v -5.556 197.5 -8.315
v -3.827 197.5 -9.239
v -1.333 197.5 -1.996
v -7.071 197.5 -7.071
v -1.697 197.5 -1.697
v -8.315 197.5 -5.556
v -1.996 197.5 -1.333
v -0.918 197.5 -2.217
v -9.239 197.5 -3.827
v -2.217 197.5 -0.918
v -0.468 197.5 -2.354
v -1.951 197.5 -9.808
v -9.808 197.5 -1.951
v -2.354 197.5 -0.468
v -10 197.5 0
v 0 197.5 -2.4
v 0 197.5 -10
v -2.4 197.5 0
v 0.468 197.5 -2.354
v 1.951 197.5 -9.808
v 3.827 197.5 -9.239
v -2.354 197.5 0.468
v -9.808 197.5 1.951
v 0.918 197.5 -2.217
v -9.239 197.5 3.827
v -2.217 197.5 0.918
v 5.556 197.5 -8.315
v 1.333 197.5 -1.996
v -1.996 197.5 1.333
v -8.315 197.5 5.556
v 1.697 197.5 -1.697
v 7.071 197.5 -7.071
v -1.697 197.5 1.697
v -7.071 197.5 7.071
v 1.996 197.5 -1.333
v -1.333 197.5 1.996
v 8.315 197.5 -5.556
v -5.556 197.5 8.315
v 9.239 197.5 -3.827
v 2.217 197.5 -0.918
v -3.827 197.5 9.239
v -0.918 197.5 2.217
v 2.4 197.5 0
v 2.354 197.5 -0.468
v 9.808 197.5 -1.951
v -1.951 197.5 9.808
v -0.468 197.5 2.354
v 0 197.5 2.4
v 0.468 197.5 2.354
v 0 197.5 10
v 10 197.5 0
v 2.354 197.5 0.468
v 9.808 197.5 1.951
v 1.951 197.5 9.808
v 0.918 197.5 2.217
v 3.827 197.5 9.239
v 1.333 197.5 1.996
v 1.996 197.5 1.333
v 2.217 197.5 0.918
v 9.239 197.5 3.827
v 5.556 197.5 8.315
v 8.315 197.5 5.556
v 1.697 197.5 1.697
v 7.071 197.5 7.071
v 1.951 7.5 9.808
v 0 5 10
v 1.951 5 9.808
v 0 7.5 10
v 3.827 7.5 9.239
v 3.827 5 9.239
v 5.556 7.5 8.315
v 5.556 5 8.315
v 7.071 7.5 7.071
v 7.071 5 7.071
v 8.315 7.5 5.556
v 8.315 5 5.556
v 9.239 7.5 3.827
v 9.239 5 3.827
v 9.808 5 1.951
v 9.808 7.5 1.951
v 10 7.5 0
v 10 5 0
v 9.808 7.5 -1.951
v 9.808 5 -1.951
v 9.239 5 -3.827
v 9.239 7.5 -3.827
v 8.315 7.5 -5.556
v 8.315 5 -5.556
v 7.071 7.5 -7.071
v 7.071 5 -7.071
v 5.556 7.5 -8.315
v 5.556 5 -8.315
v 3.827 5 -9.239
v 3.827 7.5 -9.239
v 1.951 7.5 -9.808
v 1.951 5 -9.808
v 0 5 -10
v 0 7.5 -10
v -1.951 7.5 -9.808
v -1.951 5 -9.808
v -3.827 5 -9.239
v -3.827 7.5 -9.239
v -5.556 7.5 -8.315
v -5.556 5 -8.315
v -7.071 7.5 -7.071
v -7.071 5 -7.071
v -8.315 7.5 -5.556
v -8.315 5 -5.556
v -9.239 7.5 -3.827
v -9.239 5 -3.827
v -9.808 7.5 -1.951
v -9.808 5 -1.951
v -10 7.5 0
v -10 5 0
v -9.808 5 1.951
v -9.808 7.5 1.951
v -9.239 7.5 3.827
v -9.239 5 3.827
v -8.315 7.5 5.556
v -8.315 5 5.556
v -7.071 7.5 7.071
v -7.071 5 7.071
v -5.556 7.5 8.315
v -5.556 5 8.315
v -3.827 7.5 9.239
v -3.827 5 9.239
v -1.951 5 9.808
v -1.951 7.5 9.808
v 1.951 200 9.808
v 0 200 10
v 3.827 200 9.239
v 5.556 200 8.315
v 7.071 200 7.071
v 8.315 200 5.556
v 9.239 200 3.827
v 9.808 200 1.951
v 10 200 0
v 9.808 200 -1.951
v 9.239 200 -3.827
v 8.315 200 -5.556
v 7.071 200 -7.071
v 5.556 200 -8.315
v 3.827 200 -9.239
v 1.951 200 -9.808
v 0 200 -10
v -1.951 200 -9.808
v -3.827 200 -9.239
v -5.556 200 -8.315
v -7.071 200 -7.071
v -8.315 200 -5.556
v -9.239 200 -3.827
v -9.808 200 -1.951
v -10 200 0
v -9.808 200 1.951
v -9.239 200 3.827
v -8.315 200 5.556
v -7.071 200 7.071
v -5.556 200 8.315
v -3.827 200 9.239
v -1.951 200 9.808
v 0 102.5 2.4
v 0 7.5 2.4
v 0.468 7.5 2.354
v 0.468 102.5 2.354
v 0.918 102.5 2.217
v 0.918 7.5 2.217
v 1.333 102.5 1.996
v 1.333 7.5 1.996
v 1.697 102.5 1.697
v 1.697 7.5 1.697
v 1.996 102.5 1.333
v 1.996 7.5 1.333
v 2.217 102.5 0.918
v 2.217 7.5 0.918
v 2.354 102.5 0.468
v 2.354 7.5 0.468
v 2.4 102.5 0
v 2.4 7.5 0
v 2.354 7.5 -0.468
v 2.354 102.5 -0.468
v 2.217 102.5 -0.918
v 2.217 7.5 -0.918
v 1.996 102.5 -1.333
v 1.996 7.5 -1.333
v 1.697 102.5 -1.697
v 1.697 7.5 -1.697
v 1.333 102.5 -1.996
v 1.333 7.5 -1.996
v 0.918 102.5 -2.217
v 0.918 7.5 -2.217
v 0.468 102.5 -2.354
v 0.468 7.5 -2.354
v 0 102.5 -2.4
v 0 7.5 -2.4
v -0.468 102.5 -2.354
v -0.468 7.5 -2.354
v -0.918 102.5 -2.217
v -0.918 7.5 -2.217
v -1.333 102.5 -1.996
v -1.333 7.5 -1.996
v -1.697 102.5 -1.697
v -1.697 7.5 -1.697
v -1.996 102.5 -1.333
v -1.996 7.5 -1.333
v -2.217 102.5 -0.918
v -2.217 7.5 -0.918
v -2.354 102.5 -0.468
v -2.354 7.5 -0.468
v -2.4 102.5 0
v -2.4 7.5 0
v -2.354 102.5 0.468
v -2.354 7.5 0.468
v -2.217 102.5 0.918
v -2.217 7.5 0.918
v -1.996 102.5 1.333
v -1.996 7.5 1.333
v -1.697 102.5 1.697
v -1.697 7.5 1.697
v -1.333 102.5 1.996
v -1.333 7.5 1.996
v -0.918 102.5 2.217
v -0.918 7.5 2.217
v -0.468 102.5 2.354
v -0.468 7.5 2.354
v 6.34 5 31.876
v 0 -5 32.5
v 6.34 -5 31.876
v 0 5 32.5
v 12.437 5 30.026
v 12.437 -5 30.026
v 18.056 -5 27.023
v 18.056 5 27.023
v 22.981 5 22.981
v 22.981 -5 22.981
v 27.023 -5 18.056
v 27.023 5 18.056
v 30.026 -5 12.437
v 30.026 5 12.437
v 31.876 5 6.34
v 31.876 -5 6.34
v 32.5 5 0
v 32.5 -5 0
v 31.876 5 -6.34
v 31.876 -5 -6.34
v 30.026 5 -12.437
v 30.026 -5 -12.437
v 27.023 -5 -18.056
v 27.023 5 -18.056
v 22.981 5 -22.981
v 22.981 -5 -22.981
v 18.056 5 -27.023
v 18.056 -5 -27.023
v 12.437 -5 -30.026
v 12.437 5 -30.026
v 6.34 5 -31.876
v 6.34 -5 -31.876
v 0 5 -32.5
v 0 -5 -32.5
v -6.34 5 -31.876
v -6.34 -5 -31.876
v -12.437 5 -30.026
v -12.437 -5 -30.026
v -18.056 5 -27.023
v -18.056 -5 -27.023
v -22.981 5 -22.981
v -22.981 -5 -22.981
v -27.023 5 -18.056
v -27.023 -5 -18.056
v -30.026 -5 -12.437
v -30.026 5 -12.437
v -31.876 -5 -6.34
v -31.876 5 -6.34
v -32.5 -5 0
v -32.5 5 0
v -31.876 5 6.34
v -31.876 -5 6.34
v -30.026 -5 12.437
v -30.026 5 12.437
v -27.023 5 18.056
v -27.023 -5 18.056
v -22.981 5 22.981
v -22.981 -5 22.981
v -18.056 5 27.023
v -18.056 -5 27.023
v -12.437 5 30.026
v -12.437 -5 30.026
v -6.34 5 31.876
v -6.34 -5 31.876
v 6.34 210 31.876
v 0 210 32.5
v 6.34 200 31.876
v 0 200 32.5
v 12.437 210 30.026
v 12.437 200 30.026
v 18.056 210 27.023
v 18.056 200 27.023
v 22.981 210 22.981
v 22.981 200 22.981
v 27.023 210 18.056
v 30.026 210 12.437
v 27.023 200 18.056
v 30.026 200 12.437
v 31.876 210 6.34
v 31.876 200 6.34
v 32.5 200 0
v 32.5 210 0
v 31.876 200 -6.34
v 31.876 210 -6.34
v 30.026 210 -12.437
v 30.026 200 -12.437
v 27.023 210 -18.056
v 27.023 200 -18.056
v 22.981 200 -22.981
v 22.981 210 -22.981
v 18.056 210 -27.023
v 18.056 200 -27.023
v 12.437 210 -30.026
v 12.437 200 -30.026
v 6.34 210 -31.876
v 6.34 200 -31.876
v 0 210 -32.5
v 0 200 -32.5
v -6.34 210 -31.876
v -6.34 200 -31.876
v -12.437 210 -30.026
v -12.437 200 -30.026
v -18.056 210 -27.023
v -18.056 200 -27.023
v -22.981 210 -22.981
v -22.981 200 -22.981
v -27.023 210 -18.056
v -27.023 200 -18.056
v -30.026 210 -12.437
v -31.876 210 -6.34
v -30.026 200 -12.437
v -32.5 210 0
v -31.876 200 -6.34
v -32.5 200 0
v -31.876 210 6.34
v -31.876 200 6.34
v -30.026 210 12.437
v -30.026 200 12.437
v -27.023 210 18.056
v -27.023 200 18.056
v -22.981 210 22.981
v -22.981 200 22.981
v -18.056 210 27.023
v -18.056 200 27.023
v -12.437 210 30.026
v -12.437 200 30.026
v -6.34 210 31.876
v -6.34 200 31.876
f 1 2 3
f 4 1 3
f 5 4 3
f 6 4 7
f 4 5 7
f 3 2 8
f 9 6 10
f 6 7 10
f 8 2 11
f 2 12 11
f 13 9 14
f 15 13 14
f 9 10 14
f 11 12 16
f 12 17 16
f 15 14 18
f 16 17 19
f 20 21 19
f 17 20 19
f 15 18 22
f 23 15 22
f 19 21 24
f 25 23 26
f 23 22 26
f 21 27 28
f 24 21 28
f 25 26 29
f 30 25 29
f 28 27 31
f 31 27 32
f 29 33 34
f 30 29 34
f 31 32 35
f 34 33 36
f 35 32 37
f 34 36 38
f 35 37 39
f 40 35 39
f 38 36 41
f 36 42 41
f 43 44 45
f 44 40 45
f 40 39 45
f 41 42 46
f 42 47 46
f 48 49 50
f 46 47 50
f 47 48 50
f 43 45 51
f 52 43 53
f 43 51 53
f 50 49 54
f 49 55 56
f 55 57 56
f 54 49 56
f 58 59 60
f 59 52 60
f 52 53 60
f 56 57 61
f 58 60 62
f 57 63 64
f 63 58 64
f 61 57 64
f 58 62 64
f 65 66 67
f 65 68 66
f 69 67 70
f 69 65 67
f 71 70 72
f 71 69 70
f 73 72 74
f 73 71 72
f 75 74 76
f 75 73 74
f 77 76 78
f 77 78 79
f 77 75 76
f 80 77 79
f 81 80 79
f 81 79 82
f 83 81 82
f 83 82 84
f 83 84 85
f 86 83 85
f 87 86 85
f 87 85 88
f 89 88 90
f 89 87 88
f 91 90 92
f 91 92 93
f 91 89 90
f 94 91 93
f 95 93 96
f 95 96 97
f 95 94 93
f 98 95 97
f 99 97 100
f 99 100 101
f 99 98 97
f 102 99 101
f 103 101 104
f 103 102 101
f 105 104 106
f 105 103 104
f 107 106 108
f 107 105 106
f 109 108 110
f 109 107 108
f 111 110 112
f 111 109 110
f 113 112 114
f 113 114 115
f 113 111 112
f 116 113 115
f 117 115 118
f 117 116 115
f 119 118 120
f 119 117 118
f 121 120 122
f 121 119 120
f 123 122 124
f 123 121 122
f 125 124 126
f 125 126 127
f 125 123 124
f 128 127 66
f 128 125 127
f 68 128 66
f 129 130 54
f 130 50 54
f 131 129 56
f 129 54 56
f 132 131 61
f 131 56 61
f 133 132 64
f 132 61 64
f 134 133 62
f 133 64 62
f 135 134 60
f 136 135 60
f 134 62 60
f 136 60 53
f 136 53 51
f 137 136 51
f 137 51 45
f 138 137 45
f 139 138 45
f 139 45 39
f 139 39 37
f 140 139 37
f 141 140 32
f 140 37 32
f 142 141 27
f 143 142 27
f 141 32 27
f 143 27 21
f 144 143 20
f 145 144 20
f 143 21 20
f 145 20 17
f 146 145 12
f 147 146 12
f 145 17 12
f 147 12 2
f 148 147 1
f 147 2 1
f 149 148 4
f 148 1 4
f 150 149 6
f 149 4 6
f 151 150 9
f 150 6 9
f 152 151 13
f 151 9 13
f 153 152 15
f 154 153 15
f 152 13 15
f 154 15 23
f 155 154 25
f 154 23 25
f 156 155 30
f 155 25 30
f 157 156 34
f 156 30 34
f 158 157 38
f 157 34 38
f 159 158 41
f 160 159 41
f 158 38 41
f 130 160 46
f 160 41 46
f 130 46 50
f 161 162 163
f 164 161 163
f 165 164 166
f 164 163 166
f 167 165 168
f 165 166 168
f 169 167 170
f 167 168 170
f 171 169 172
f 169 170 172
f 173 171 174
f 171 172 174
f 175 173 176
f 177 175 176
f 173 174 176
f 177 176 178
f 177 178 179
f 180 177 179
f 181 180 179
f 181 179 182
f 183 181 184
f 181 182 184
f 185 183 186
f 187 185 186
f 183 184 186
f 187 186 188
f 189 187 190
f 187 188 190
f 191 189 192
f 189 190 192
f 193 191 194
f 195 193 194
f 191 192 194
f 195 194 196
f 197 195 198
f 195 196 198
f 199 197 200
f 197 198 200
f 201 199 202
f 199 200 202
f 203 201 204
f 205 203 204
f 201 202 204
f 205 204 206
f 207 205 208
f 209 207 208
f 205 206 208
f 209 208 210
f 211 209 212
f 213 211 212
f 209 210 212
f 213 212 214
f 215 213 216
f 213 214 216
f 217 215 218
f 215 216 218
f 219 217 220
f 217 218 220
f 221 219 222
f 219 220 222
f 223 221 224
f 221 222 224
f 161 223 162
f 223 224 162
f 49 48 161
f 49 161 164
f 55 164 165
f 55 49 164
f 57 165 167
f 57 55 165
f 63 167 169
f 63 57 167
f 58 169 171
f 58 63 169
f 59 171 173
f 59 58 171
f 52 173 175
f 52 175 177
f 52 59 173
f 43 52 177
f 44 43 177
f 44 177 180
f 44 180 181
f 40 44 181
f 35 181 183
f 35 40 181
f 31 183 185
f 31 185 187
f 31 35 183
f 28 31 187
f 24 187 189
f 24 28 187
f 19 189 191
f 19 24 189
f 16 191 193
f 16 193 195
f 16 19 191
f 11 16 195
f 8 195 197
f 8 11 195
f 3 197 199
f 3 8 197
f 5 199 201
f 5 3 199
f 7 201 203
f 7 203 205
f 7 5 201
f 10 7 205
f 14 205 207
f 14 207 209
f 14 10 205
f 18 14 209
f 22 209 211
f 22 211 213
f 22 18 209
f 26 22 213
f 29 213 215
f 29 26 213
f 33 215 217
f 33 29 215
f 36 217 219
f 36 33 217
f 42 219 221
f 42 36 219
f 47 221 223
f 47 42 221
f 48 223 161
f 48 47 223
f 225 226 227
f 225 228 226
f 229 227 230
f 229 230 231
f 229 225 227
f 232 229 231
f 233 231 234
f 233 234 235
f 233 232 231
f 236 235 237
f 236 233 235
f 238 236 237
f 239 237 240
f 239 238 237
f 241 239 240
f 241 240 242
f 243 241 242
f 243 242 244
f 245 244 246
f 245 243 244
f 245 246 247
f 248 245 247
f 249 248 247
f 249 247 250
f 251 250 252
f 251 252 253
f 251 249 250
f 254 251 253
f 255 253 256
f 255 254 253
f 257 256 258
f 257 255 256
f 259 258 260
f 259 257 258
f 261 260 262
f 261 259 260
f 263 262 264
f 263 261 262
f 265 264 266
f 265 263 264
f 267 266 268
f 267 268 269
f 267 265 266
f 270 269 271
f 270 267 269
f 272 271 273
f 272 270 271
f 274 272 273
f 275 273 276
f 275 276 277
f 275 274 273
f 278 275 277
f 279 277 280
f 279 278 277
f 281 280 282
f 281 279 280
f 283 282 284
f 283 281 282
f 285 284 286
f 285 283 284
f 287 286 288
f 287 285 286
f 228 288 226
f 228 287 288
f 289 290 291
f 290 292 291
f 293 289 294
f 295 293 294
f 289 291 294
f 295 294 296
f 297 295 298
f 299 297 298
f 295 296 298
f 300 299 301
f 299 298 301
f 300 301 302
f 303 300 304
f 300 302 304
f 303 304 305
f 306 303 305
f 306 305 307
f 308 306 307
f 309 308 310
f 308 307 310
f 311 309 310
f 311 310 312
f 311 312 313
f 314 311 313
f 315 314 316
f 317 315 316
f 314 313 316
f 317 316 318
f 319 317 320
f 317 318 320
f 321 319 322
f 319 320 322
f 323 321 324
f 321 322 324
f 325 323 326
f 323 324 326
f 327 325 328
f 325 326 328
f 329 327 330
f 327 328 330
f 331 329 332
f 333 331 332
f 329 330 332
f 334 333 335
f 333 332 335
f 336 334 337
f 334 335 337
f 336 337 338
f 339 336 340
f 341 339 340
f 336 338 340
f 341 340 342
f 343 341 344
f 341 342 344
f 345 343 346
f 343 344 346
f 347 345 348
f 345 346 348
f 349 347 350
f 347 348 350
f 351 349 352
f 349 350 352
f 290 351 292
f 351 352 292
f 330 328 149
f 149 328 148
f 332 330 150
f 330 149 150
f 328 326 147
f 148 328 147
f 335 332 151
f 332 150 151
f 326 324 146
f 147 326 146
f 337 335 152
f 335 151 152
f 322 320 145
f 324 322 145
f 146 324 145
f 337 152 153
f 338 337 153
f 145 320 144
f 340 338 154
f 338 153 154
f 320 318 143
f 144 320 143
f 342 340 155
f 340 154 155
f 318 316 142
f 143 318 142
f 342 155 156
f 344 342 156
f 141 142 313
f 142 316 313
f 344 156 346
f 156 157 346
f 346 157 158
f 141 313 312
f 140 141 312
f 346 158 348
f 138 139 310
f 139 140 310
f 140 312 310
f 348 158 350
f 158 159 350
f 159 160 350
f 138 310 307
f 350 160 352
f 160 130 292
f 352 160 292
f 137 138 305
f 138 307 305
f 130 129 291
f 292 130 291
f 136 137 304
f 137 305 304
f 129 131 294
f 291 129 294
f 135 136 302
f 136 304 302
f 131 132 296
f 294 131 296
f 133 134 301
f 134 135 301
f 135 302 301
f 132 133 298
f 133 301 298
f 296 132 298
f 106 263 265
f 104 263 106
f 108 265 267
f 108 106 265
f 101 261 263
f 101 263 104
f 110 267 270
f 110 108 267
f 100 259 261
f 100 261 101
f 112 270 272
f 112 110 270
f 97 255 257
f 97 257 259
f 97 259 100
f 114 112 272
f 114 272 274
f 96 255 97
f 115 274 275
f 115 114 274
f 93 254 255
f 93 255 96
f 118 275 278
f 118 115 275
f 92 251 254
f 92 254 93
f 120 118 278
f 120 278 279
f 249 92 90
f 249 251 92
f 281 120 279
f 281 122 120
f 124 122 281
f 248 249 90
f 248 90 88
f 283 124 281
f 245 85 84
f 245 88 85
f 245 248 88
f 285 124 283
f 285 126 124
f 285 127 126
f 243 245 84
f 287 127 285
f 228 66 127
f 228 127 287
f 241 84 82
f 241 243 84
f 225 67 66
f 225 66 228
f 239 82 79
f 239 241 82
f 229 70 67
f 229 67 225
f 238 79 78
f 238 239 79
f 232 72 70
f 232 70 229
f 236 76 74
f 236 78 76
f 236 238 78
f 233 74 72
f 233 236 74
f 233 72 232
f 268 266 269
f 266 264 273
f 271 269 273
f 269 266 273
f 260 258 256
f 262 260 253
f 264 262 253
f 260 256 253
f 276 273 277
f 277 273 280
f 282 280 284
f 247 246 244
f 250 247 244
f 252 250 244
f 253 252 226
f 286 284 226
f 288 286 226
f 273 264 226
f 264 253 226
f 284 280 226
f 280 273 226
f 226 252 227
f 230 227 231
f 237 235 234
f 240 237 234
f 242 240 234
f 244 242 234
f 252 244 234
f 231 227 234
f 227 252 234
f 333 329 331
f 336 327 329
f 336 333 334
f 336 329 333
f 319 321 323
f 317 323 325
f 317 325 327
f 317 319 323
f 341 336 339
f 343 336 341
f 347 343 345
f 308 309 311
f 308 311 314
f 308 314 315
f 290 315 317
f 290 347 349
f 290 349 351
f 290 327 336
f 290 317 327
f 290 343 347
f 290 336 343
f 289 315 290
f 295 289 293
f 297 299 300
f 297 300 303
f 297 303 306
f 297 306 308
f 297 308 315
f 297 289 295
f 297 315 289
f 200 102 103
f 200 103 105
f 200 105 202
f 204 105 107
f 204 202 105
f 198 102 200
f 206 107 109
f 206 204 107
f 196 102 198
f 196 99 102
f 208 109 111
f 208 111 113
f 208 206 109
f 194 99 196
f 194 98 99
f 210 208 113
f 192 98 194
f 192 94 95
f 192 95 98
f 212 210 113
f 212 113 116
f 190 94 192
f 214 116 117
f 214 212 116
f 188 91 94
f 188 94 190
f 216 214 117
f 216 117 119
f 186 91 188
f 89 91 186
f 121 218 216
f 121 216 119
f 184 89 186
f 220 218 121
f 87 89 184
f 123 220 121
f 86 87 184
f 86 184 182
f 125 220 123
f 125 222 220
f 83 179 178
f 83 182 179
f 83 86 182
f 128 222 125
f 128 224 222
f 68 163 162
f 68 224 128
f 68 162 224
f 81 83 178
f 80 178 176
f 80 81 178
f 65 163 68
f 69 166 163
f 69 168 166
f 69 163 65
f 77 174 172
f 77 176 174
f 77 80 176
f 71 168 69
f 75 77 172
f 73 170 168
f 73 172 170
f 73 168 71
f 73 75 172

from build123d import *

# Parameters (mm, degrees)
SKETCH1_R           = 32.5
BOSS_EXTRUDE1_DEPTH = 5
SKETCH2_R           = 10
BOSS_EXTRUDE2_DEPTH = 2.5
SKETCH3_R           = 2.4
BOSS_EXTRUDE3_DEPTH = 95


with BuildPart() as part:
    # Sketch1 → Boss-Extrude1 (new, symmetric)
    with BuildSketch(Plane(origin=(0, 0, 0), x_dir=(1, 0, 0), z_dir=(0, 1, 0))):
        with Locations(Location((0, 0, 0), (0, 0, 270))):
            Circle(SKETCH1_R)
    extrude(amount=BOSS_EXTRUDE1_DEPTH, both=True)

    # Sketch2 → Boss-Extrude2 (add, symmetric)
    with BuildSketch(Plane(origin=(0, 5, 0), x_dir=(1, 0, 0), z_dir=(0, 1, 0))):
        with Locations(Location((0, 0, 0), (0, 0, 270))):
            Circle(SKETCH2_R)
    extrude(amount=BOSS_EXTRUDE2_DEPTH, both=True)

    # Sketch3 → Boss-Extrude3 (add)
    with BuildSketch(Plane(origin=(0, 7.5, 0), x_dir=(1, 0, 0), z_dir=(0, 1, 0))):
        with Locations(Location((0, 0, 0), (0, 0, 270))):
            Circle(SKETCH3_R)
    extrude(amount=BOSS_EXTRUDE3_DEPTH)

    # Mirror7: part across plane


with BuildPart() as part_1:
    add(part.part)
    add(part.part.mirror(Plane.ZX.offset(102.5)))


solid = part_1.part
